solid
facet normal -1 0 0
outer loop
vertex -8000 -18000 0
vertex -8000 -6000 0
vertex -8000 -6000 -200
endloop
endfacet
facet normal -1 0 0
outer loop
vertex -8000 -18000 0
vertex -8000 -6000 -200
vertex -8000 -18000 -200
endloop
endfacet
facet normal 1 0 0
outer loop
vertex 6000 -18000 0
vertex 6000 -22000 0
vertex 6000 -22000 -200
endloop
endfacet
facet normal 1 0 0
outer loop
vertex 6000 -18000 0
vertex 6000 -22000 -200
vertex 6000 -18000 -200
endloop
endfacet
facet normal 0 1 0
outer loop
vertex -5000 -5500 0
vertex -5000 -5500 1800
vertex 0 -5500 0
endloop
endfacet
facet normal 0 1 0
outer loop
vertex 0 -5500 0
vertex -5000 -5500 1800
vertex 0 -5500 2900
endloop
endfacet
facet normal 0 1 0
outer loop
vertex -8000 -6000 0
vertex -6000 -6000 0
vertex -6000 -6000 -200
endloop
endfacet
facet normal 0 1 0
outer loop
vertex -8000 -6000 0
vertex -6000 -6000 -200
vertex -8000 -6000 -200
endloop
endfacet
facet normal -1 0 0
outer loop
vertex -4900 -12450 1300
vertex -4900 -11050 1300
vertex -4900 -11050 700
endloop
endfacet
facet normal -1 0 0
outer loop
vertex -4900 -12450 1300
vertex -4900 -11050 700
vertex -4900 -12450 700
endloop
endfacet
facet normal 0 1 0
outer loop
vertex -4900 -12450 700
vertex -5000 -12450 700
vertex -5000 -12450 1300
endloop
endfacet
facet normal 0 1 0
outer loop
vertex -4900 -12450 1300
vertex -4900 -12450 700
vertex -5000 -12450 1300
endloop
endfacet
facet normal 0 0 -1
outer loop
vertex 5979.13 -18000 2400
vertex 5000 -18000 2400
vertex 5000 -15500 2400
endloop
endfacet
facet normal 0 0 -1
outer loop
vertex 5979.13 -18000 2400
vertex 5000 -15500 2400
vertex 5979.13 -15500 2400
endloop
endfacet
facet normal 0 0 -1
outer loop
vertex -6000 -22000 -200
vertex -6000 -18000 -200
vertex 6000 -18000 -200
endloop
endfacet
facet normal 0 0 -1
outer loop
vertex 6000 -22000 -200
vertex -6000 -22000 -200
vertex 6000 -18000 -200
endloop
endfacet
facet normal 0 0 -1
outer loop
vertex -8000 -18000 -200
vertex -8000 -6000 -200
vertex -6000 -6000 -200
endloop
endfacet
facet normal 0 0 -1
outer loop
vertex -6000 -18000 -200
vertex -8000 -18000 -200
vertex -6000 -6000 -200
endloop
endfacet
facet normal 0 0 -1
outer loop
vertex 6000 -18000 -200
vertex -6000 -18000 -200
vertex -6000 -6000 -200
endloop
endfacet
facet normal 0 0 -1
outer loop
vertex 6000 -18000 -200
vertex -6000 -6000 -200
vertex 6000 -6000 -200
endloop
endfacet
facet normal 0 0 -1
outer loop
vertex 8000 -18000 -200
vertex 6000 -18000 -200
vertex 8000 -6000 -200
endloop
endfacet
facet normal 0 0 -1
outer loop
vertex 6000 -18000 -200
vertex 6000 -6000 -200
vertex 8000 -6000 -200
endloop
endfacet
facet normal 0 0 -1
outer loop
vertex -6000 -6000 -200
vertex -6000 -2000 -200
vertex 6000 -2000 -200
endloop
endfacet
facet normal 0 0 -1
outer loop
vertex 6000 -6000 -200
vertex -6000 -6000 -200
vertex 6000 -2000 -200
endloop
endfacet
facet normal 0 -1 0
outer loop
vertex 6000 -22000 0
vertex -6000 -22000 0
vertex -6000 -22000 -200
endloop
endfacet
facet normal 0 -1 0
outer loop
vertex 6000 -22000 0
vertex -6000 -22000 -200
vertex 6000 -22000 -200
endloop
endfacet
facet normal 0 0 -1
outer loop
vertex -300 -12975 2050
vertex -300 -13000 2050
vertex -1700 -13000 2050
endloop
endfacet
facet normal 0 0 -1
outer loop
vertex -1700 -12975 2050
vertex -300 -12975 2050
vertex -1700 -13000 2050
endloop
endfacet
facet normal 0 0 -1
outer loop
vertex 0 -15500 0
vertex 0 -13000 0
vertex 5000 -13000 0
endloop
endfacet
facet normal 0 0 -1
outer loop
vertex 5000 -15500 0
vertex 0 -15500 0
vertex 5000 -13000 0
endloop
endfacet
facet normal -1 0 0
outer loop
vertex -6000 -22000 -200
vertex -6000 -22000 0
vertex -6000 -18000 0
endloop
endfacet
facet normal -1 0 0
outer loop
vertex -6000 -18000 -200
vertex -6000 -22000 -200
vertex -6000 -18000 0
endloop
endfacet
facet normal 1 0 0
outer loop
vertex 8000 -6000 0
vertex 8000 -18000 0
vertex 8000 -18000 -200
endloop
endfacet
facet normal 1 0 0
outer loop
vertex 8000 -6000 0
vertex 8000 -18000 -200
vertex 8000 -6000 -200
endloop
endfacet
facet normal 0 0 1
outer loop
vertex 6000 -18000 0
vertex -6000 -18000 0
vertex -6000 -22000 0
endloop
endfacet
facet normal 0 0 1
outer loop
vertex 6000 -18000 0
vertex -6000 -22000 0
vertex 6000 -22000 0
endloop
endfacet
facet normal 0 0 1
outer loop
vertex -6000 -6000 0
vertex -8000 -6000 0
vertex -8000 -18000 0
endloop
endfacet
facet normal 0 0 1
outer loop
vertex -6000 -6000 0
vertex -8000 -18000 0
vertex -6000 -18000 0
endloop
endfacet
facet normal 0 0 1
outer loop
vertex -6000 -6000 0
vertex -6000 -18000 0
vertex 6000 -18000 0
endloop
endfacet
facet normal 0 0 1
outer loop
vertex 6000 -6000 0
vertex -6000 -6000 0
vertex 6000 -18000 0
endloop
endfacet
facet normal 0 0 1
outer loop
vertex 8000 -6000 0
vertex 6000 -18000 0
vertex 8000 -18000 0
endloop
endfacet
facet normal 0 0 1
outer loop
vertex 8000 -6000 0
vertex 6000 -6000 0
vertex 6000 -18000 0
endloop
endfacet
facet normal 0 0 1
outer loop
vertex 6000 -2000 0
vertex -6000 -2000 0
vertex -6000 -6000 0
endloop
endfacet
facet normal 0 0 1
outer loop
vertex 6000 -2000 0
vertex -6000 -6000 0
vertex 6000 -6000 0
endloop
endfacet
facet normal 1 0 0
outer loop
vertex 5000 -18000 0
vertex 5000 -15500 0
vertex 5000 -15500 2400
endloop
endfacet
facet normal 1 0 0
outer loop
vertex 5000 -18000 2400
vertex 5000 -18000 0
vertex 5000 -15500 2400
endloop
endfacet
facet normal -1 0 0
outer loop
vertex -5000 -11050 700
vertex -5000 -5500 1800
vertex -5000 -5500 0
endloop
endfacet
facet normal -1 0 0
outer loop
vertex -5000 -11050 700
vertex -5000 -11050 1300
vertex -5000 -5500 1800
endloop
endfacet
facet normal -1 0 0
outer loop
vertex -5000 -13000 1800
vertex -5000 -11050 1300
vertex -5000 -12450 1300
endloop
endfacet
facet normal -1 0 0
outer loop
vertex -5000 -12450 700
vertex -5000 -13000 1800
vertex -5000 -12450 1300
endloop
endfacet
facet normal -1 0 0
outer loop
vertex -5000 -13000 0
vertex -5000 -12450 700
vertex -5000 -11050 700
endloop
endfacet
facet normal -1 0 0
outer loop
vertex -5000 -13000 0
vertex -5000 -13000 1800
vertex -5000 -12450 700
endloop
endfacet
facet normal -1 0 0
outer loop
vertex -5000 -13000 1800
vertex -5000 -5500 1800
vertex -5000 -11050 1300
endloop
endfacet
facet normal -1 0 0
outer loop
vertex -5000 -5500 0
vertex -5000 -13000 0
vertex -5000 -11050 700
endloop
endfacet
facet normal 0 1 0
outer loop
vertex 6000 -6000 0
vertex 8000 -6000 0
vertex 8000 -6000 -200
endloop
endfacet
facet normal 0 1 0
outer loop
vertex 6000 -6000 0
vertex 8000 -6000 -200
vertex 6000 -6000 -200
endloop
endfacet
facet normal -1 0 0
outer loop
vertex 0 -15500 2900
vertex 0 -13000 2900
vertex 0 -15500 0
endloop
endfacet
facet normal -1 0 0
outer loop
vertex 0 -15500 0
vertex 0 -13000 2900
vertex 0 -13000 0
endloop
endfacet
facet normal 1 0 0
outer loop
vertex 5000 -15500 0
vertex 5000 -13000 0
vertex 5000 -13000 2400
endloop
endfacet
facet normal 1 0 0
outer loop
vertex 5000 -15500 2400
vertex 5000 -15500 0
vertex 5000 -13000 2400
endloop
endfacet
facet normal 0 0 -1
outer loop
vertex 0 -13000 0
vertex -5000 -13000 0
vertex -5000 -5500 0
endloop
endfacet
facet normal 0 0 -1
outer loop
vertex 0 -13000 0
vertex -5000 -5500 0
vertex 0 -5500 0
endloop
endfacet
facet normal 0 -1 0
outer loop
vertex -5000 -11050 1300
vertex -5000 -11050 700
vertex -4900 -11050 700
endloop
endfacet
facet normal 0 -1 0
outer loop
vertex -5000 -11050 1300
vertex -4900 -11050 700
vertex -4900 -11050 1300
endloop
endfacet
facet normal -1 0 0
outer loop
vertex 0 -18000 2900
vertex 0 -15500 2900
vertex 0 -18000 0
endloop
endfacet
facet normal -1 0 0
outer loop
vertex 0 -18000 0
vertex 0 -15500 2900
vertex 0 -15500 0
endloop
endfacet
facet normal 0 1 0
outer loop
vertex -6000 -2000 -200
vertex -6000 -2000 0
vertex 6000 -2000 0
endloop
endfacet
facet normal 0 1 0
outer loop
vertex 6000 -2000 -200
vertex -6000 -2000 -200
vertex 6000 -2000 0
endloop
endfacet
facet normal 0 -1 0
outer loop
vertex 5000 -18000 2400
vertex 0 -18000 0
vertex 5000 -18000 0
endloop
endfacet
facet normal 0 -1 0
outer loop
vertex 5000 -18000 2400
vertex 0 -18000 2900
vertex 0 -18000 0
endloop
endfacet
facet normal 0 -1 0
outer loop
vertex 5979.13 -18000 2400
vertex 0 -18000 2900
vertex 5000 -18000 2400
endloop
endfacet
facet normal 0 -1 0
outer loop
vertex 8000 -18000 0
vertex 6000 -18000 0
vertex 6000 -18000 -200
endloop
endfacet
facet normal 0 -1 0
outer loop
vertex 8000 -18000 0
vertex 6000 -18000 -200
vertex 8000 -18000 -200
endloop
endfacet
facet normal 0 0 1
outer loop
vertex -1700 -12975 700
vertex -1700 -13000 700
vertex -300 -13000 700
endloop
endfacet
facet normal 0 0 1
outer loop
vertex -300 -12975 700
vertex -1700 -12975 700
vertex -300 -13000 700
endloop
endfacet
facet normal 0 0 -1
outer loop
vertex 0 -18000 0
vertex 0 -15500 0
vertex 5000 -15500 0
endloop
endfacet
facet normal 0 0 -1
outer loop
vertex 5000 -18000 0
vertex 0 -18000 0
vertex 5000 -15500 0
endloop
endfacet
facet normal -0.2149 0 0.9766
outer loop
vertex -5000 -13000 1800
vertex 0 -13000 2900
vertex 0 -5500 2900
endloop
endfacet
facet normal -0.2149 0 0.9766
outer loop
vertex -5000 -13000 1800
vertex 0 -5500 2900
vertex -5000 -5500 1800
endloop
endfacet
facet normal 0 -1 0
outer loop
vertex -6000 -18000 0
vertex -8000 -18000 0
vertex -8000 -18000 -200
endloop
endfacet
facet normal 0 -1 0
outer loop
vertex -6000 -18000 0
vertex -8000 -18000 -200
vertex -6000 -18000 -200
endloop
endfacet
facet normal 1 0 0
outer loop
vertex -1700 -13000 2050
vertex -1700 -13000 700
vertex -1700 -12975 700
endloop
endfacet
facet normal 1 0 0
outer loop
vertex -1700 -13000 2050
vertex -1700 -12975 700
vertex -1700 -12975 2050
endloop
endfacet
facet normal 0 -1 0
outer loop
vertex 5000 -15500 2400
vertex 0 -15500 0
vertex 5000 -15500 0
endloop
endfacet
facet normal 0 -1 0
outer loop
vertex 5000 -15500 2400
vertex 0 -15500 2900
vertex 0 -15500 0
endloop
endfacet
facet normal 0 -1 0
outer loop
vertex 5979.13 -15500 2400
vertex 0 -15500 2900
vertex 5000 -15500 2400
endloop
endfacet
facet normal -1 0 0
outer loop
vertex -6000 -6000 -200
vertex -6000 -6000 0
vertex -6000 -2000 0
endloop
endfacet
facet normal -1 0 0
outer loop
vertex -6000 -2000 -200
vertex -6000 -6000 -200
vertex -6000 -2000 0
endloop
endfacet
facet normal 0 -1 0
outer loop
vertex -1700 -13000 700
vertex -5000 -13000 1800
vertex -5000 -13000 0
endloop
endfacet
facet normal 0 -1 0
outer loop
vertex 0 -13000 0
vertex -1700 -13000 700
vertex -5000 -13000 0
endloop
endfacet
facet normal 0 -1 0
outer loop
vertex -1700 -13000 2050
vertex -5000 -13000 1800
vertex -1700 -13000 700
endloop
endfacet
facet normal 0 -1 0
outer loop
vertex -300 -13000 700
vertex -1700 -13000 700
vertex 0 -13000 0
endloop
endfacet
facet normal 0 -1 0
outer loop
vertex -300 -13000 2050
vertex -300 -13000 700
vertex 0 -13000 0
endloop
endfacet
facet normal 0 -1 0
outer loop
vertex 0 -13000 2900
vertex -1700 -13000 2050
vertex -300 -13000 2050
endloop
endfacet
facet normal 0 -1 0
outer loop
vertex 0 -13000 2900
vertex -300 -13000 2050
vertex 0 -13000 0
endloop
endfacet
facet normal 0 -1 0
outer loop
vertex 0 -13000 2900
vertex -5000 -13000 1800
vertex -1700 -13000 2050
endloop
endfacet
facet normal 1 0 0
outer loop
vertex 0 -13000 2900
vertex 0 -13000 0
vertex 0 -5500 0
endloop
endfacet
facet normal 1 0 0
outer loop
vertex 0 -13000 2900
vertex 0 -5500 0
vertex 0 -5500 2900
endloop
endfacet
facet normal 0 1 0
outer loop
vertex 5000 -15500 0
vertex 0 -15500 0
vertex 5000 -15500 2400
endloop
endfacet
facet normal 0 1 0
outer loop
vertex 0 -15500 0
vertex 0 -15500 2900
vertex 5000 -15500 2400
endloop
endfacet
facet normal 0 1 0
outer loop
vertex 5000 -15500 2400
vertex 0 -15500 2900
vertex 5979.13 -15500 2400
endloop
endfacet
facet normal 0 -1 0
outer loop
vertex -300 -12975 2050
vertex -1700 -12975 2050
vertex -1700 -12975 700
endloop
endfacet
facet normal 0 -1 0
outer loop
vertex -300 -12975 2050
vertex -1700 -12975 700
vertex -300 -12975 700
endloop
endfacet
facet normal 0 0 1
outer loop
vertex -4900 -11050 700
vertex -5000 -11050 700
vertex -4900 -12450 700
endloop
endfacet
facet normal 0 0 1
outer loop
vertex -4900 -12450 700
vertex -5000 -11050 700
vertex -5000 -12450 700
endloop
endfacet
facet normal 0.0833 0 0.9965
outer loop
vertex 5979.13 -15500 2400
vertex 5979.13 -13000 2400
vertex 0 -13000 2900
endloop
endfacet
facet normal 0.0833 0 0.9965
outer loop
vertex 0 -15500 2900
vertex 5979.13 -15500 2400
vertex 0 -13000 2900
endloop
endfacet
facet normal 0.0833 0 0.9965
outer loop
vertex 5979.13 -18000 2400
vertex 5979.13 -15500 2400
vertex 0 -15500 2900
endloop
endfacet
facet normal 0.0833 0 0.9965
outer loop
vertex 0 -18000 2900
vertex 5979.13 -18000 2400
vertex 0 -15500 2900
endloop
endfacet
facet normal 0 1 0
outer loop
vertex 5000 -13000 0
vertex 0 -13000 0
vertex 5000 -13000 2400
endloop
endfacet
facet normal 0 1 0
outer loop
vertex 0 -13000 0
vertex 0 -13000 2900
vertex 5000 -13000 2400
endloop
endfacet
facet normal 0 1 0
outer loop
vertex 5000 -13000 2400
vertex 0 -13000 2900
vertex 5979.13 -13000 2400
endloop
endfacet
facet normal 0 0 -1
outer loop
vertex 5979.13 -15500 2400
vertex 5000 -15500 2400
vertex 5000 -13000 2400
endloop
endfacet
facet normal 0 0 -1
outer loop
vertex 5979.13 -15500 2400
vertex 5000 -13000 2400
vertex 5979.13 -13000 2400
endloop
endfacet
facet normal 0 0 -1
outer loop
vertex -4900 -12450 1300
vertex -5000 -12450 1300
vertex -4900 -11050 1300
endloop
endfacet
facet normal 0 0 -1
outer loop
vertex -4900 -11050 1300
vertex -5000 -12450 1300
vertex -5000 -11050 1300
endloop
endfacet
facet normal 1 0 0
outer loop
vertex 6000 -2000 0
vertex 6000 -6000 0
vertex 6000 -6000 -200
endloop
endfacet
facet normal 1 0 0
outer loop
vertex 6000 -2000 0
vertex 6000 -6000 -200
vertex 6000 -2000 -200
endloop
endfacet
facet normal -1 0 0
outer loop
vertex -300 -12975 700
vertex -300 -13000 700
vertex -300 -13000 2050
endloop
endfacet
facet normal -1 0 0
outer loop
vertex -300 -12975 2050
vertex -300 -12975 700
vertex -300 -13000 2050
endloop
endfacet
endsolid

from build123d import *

# Parameters (mm, degrees)
F2_W      = 5000
F2_H      = 2400
F3_DEPTH  = 2500
F4_DEPTH  = 2500
F5_DEPTH  = 7500
F6_W      = 12000
F6_H      = 4000
F7_DEPTH  = 200
F8_W      = 700
F8_H      = 600
F9_DEPTH  = 100
F10_W     = 700
F10_H     = 1350
F11_DEPTH = 25


# Not quite as in the source:
# - a feature names something its author has since deleted; it is built from what else it names


with BuildPart() as f3:
    # F2 (on offset) → F3 (new body)
    with BuildSketch(Plane.XZ.offset(13000)):
        with Locations((2500, 1200)):
            Rectangle(F2_W, F2_H)
        Polygon((0, 2900), (0, 2400), (5000, 2400), (5979.1303715507, 2400), align=None)
    extrude(amount=F3_DEPTH)


with BuildPart() as f4:
    # F4 (new): a face of the model
    f4_faces = [f3.part.faces().sort_by_distance(p)[0] for p in [
        (2500, -15500, 66.4529909033),
    ]]
    extrude(f4_faces, amount=F4_DEPTH)


with BuildPart() as f5:
    # F2 (on offset) → F5 (new body)
    with BuildSketch(Plane.XZ.offset(13000)):
        Polygon((-5000, 0), (0, 0), (0, 2400), (0, 2900), (-5000, 1800), align=None)
    extrude(amount=-F5_DEPTH)

    # F8 (on face) → F9 (cut)
    with BuildSketch(Plane(origin=(-5000, 0, 0), x_dir=(0, -1, 0), z_dir=(-1, 0, 0))):
        with Locations((11400, 1000)):
            Rectangle(F8_W, F8_H)
        with Locations((12100, 1000)):
            Rectangle(F8_W, F8_H)
    extrude(amount=-F9_DEPTH, mode=Mode.SUBTRACT)

    # F10 (on face) → F11 (cut)
    with BuildSketch(Plane.XZ.offset(13000)):
        with Locations((-1350, 1375)):
            Rectangle(F10_W, F10_H)
        with Locations((-650, 1375)):
            Rectangle(F10_W, F10_H)
    extrude(amount=-F11_DEPTH, mode=Mode.SUBTRACT)


with BuildPart() as f7:
    # F6 (on Top) → F7 (new body)
    with BuildSketch(Plane.XY):
        with Locations((0, -20000)):
            Rectangle(F6_W, F6_H)
        Polygon((-6000, -6000), (-8000, -6000), (-8000, -18000), (-6000, -18000), (6000, -18000), (8000, -18000), (8000, -6000), (6000, -6000), align=None)
        with Locations((0, -4000)):
            Rectangle(F6_W, F6_H)
    extrude(amount=-F7_DEPTH)


solid = Compound([f3.part, f4.part, f5.part, f7.part])
